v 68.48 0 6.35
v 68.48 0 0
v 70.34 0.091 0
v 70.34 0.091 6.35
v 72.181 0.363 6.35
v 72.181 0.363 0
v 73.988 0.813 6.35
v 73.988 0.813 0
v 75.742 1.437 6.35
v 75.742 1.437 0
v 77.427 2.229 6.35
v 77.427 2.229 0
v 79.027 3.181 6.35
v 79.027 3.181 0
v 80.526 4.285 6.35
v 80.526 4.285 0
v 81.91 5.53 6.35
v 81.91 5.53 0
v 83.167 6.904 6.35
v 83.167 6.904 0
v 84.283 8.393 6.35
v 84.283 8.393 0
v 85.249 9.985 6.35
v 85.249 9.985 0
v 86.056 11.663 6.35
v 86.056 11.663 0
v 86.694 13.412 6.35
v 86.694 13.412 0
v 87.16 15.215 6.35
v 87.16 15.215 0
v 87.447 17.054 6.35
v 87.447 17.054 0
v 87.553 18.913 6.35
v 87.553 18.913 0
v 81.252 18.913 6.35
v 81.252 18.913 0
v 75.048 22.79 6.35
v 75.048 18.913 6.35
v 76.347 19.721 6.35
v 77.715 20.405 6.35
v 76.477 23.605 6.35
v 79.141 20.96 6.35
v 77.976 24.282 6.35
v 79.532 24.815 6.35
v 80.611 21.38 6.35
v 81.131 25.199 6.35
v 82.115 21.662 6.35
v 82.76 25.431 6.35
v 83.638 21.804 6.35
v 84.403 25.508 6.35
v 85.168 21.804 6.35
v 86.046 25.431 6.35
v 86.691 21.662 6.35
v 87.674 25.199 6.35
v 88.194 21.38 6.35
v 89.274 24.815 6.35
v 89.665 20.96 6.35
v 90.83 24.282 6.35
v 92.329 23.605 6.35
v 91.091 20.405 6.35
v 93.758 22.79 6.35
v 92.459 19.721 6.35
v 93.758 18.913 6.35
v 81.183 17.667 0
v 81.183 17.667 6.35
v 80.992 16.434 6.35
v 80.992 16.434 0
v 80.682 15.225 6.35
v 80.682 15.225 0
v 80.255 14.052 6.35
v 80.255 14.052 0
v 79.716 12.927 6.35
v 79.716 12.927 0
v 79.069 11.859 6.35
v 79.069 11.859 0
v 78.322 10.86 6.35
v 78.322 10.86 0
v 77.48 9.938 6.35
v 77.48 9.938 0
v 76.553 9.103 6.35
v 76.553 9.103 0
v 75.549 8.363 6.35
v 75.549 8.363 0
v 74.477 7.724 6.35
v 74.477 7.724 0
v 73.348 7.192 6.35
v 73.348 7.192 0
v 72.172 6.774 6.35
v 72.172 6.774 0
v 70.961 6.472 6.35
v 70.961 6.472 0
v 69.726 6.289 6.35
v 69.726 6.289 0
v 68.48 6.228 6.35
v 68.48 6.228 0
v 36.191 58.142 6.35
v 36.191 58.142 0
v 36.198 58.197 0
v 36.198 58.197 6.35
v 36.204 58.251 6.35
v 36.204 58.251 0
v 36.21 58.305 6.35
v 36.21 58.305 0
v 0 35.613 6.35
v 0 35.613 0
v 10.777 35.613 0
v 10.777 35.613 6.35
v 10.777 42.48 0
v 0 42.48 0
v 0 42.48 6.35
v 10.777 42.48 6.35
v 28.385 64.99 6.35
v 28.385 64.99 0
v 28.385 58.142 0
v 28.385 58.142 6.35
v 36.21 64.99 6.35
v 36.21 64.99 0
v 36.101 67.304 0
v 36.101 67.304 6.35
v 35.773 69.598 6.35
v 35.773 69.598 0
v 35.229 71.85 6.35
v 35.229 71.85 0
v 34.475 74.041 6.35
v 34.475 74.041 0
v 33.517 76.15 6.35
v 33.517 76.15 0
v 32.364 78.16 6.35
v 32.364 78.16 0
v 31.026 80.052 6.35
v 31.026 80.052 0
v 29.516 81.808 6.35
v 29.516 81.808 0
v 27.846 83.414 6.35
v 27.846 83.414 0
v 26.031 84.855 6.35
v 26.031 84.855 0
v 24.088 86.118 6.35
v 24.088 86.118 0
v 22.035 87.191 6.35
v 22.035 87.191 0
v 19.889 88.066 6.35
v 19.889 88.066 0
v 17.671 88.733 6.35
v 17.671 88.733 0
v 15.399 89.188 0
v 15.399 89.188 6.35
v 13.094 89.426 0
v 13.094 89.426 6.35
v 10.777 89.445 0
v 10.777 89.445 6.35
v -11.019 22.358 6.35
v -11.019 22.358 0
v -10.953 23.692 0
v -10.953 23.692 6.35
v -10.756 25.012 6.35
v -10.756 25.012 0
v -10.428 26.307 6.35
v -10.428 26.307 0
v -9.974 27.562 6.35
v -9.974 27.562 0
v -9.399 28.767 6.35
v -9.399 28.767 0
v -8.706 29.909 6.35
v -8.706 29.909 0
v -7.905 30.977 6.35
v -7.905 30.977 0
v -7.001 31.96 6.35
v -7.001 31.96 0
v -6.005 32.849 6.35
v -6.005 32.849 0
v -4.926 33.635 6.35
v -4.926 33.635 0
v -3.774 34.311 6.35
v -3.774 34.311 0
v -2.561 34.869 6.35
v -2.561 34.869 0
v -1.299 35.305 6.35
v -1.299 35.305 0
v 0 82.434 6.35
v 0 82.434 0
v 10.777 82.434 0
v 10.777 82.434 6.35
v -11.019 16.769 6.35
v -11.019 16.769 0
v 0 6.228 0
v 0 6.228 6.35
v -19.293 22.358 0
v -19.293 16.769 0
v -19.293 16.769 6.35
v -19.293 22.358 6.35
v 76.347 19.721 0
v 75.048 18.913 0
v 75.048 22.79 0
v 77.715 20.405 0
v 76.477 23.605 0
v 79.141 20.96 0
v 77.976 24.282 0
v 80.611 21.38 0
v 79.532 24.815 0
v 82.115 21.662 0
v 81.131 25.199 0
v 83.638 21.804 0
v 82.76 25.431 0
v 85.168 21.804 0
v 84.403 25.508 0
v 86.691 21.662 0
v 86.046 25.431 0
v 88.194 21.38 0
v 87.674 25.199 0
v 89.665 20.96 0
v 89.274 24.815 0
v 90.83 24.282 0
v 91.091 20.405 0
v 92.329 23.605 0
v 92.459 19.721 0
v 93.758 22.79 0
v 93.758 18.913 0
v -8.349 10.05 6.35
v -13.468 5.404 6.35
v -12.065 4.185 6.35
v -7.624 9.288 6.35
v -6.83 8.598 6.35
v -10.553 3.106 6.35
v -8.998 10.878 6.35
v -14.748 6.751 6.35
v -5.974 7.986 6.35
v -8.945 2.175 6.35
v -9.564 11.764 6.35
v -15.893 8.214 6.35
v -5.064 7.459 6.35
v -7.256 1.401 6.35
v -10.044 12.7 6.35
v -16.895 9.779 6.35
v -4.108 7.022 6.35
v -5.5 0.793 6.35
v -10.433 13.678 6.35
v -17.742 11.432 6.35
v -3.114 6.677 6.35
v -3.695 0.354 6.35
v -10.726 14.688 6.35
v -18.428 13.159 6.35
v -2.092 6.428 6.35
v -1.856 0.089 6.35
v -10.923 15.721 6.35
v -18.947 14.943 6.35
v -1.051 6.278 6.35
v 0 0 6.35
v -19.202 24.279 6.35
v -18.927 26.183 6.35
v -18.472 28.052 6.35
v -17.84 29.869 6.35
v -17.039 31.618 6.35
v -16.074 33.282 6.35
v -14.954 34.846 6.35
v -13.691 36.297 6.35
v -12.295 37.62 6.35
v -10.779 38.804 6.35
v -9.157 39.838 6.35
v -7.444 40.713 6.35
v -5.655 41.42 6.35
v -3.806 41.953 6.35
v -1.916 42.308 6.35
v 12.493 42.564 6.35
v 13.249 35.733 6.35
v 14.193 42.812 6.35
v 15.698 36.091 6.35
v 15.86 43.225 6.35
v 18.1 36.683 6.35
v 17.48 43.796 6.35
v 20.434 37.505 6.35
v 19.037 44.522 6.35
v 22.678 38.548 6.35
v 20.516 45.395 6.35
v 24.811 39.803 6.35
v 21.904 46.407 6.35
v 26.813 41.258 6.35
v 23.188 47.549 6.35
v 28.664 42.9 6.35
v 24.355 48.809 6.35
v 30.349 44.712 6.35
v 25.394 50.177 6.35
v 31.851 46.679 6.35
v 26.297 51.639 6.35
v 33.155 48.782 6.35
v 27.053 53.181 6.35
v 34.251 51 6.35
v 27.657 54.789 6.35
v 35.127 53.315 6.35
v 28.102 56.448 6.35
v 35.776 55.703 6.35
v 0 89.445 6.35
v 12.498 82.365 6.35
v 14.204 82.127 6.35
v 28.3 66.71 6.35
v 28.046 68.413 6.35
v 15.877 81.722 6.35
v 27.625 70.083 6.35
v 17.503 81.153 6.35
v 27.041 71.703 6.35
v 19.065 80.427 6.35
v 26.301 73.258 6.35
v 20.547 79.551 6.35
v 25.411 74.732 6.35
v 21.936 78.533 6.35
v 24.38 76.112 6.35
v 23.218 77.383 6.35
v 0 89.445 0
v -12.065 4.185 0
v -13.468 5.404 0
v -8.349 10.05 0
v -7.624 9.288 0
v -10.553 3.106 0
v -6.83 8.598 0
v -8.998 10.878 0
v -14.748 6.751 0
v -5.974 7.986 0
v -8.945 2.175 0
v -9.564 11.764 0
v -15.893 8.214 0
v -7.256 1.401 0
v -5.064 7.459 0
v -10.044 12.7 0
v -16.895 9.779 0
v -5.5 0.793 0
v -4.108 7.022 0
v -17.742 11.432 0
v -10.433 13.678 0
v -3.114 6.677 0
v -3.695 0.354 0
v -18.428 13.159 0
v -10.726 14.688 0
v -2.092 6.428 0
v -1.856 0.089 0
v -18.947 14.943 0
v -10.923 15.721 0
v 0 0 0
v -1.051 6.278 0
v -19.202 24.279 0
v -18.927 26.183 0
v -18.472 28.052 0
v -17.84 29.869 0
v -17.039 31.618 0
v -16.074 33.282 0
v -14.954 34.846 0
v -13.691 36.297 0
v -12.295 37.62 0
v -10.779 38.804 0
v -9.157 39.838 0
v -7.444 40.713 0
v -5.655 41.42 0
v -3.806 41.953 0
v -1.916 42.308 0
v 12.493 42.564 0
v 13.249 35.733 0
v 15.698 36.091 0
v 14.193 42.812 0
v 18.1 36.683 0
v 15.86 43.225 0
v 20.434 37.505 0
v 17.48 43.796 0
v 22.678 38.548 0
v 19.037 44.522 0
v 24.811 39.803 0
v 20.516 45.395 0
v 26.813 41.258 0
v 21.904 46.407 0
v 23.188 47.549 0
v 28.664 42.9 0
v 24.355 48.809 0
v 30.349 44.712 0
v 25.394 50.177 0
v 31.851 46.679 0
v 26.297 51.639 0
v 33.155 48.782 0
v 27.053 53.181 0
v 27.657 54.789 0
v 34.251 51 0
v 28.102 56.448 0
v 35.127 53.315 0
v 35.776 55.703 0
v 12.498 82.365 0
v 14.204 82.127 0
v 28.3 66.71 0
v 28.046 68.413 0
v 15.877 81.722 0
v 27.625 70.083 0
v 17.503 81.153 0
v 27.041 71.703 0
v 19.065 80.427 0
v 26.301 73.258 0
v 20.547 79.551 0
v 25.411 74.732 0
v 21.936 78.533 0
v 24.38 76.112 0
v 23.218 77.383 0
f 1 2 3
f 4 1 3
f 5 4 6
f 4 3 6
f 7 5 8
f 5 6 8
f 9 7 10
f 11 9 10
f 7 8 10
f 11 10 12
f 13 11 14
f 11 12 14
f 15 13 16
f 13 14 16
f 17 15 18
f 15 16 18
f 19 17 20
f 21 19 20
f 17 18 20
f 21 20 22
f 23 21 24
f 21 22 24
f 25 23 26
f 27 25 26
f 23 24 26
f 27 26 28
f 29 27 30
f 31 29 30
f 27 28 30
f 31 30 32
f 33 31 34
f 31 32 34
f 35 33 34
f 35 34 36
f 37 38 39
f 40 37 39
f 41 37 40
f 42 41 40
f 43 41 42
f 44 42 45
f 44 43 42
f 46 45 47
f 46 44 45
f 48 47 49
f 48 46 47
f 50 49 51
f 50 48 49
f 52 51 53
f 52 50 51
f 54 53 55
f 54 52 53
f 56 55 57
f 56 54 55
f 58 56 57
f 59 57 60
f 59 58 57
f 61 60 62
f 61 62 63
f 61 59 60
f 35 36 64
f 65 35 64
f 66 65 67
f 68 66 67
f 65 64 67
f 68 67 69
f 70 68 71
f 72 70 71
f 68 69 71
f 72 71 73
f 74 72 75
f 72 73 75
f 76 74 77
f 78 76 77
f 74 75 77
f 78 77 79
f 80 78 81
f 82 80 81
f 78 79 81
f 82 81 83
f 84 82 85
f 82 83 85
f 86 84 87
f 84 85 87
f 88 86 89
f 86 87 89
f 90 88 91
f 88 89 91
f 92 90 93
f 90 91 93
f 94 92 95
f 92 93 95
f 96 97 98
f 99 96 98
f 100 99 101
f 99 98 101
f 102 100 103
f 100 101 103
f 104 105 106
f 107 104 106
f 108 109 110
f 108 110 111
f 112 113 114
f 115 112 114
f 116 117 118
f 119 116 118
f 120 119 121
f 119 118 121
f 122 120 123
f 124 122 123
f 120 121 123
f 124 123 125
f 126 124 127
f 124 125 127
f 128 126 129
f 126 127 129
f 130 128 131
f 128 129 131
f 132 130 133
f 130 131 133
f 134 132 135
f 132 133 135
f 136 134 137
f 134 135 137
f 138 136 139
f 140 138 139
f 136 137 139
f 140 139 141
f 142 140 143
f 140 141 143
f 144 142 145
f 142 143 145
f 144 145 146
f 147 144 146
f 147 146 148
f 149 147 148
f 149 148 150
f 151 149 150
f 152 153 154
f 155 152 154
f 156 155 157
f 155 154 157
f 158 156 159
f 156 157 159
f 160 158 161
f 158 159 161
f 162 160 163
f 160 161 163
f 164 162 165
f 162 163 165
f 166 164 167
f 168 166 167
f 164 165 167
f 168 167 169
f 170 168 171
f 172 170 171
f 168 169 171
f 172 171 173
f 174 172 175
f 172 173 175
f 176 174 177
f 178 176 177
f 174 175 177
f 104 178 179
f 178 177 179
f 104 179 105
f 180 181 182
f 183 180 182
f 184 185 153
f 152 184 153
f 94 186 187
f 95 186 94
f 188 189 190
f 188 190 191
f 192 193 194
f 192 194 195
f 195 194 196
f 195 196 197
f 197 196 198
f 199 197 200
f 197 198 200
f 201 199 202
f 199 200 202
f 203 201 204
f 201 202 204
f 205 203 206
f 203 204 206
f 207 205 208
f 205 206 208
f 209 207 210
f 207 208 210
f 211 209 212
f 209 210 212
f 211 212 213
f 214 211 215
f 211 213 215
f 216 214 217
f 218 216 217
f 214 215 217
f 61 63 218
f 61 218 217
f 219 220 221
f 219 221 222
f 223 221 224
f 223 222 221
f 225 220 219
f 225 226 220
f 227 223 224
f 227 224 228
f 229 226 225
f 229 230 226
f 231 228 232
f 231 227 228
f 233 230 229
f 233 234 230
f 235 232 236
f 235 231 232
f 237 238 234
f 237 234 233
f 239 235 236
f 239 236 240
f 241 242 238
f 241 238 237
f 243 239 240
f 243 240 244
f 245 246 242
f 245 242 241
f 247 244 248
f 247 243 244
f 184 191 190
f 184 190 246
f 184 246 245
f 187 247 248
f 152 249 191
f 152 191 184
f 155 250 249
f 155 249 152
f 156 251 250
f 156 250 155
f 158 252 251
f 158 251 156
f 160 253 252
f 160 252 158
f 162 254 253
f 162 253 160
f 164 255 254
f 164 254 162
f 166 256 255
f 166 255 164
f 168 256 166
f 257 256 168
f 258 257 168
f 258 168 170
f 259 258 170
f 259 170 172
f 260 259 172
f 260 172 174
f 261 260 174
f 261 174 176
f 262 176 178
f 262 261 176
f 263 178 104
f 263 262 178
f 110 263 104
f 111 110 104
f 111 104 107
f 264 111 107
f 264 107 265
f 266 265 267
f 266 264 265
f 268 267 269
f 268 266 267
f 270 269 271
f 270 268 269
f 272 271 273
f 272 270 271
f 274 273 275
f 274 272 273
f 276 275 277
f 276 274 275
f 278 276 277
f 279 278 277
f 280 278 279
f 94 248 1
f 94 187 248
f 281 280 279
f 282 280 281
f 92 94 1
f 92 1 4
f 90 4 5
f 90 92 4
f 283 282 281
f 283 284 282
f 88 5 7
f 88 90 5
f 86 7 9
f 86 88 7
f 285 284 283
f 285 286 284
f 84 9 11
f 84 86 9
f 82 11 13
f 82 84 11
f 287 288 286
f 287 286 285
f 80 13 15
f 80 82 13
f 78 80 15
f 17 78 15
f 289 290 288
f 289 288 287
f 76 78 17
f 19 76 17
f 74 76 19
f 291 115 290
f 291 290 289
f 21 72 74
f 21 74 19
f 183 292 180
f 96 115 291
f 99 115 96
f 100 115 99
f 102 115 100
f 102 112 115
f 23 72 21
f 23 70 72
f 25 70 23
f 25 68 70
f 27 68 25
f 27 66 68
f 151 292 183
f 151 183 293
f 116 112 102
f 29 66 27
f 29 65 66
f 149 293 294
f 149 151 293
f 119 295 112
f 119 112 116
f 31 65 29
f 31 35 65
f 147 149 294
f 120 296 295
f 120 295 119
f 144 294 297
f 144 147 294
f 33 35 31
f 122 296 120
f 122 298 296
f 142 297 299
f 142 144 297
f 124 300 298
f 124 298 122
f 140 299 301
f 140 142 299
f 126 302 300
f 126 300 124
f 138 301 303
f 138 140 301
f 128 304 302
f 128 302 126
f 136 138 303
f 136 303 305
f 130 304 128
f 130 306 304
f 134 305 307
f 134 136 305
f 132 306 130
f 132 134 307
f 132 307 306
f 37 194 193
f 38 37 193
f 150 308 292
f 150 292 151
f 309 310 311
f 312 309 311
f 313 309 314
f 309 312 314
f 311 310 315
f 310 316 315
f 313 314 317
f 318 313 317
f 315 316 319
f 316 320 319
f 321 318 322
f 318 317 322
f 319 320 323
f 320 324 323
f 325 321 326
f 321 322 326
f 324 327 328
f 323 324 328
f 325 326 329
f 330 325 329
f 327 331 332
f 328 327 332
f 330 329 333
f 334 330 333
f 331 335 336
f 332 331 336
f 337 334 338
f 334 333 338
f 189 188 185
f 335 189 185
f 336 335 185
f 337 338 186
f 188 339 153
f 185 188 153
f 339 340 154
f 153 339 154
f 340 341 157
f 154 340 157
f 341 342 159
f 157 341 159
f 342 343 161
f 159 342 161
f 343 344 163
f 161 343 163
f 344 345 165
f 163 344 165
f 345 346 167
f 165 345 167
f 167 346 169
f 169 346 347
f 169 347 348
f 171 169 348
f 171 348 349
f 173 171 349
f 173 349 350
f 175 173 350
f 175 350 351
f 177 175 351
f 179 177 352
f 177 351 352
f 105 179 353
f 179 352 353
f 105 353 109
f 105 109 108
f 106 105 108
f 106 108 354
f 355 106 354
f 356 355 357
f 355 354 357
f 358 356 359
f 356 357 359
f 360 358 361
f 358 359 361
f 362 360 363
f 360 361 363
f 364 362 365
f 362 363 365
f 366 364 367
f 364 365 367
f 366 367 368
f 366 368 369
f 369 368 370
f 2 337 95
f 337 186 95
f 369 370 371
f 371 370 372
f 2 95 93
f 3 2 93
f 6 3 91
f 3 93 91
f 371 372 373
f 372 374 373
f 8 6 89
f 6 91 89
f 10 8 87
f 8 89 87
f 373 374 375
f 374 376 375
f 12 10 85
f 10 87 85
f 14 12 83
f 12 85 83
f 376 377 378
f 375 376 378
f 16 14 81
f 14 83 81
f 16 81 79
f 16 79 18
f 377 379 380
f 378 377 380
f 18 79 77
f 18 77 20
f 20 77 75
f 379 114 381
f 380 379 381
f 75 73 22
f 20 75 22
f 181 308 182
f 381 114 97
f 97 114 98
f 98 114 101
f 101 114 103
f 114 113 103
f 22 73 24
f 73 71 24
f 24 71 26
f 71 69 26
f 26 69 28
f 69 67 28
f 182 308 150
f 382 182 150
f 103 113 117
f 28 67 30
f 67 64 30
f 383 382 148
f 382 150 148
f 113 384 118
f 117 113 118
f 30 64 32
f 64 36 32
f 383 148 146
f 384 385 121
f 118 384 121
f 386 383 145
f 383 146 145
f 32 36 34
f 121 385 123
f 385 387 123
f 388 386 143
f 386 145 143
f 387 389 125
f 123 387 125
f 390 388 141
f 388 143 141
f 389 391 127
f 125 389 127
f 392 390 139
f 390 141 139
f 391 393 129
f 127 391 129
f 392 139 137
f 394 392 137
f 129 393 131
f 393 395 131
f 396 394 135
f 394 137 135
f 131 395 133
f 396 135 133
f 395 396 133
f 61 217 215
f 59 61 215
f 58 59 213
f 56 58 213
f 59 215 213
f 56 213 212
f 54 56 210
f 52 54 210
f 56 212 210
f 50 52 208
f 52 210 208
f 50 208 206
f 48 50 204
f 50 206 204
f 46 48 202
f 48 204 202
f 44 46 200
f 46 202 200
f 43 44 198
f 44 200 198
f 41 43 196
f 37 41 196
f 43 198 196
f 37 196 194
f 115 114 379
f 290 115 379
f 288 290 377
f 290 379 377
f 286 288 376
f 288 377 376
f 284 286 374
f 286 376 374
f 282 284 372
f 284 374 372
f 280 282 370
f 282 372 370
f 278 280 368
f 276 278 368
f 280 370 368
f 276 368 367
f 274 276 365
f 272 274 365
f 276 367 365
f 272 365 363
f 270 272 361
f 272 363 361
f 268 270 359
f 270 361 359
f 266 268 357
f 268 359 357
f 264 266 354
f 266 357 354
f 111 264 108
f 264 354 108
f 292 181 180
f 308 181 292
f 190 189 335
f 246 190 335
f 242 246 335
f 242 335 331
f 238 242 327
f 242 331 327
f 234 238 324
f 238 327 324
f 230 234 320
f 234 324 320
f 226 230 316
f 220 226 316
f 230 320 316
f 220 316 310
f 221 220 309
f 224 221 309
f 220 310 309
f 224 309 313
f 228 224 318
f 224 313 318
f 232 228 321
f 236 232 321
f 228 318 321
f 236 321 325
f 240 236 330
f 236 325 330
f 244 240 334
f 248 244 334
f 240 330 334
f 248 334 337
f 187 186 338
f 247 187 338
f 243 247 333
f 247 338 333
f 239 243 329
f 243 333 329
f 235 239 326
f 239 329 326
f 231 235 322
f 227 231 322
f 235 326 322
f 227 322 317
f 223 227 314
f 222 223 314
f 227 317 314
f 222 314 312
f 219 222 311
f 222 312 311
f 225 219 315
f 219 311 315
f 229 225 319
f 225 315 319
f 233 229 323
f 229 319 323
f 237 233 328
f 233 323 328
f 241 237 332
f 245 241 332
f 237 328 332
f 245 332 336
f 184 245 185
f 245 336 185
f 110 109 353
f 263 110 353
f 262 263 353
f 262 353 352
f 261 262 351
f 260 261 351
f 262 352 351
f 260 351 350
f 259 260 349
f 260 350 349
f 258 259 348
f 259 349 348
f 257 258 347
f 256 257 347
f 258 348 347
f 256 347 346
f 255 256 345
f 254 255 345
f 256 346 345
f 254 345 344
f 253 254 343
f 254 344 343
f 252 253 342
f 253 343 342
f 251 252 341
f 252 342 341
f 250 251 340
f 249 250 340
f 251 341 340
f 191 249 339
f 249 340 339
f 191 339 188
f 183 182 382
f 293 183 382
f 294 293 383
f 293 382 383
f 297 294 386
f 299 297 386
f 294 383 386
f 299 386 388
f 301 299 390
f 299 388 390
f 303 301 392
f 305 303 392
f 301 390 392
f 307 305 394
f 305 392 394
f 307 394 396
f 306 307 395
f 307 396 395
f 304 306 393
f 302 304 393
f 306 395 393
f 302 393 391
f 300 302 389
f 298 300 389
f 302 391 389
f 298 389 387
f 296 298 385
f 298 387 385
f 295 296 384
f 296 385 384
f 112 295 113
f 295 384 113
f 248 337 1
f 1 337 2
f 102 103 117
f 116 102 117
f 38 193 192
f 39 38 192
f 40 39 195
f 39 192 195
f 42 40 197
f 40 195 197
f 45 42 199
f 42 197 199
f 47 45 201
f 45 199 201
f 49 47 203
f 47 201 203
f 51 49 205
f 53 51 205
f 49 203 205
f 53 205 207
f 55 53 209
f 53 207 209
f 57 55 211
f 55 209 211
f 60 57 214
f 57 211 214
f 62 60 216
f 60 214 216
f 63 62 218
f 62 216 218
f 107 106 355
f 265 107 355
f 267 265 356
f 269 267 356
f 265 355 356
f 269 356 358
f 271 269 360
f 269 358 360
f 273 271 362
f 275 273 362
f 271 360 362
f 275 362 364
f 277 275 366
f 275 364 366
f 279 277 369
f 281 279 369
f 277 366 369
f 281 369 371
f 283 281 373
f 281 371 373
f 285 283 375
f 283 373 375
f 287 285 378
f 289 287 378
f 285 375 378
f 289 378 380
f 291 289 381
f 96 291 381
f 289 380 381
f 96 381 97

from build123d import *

# Parameters (mm, degrees)
F0_W     = 8.2740507926
F0_H     = 5.5895205587
F0_W_2   = 68.4800110757
F0_H_2   = 6.2283235602
F0_W_3   = 10.7772583142
F0_H_3   = 6.8671256304
F0_H_4   = 7.0104077458
F1_DEPTH = 6.35


with BuildPart() as f1:
    # F0 (on Top) → F1 (new body)
    with BuildSketch(Plane.XY):
        with BuildLine():
            ThreePointArc((0, 42.4803607166), (-13.6907672304, 36.296708565), (-19.2933924403, 22.3580840975))
            Line((-19.2933924403, 22.3580840975), (-11.0193416476, 22.3580840975))
            ThreePointArc((-11.0193416476, 22.3580840975), (-7.9047387189, 30.9767399974), (0, 35.6132350862))
            Line((0, 35.6132350862), (0, 42.4803607166))
        make_face()
        with Locations((-15.1563670439, 19.5633238181)):
            Rectangle(F0_W, F0_H)
        with BuildLine():
            ThreePointArc((-19.2933924403, 16.7685635388), (-12.781037859, 4.7780048728), (0, 0))
            Line((0, 0), (0, 6.2283235602))
            ThreePointArc((0, 6.2283235602), (-7.62434504, 9.2876478078), (-11.0193416476, 16.7685635388))
            Line((-11.0193416476, 16.7685635388), (-19.2933924403, 16.7685635388))
        make_face()
        with Locations((34.2400055379, 3.1141617801)):
            Rectangle(F0_W_2, F0_H_2)
        with Locations((5.3886291571, 39.0467979014)):
            Rectangle(F0_W_3, F0_H_3)
        with BuildLine():
            ThreePointArc((28.3847991377, 58.1422746181), (22.559883668, 46.9624095883), (10.7772583142, 42.4803607166))
            Line((10.7772583142, 42.4803607166), (10.7772583142, 35.6132350862))
            ThreePointArc((10.7772583142, 35.6132350862), (27.7583274267, 42.0563529076), (36.1912153179, 58.1422746181))
            Line((36.1912153179, 58.1422746181), (28.3847991377, 58.1422746181))
        make_face()
        with BuildLine():
            Line((28.3847991377, 64.9896487594), (28.3847991377, 58.1422746181))
            Line((28.3847991377, 58.1422746181), (36.1912153179, 58.1422746181))
            ThreePointArc((36.1912153179, 58.1422746181), (36.2009267231, 58.2237741986), (36.2103767693, 58.3053044975))
            Line((36.2103767693, 58.3053044975), (36.2103767693, 64.9896487594))
            Line((36.2103767693, 64.9896487594), (28.3847991377, 64.9896487594))
        make_face()
        with BuildLine():
            ThreePointArc((10.7772583142, 82.4341624975), (23.2176923218, 77.3825555351), (28.3847991377, 64.9896487594))
            Line((28.3847991377, 64.9896487594), (36.2103767693, 64.9896487594))
            ThreePointArc((36.2103767693, 64.9896487594), (28.6996014024, 82.6311247403), (10.7772583142, 89.4445702434))
            Line((10.7772583142, 89.4445702434), (10.7772583142, 82.4341624975))
        make_face()
        with Locations((5.3886291571, 85.9393663704)):
            Rectangle(F0_W_3, F0_H_4)
        with BuildLine():
            Line((68.4800110757, 6.2283235602), (68.4800110757, 0))
            ThreePointArc((68.4800110757, 0), (81.9103012367, 5.5298030695), (87.5533744693, 18.9128946513))
            Line((87.5533744693, 18.9128946513), (81.252284348, 18.9128946513))
            ThreePointArc((81.252284348, 18.9128946513), (77.4804181263, 9.9382634079), (68.4800110757, 6.2283235602))
        make_face()
    extrude(amount=F1_DEPTH)


with BuildPart() as f1b:
    # F0 (on Top) → F1, piece 2 (new body)
    with BuildSketch(Plane.XY):
        with BuildLine():
            ThreePointArc((75.0481337309, 18.9128946513), (84.4028294086, 21.8217318529), (93.7575250864, 18.9128946513))
            Line((93.7575250864, 18.9128946513), (93.7575250864, 22.7904897183))
            ThreePointArc((93.7575250864, 22.7904897183), (84.4028294086, 25.5081040885), (75.0481337309, 22.7904897183))
            Line((75.0481337309, 22.7904897183), (75.0481337309, 18.9128946513))
        make_face()
    extrude(amount=F1_DEPTH)


solid = Compound([f1.part, f1b.part])
